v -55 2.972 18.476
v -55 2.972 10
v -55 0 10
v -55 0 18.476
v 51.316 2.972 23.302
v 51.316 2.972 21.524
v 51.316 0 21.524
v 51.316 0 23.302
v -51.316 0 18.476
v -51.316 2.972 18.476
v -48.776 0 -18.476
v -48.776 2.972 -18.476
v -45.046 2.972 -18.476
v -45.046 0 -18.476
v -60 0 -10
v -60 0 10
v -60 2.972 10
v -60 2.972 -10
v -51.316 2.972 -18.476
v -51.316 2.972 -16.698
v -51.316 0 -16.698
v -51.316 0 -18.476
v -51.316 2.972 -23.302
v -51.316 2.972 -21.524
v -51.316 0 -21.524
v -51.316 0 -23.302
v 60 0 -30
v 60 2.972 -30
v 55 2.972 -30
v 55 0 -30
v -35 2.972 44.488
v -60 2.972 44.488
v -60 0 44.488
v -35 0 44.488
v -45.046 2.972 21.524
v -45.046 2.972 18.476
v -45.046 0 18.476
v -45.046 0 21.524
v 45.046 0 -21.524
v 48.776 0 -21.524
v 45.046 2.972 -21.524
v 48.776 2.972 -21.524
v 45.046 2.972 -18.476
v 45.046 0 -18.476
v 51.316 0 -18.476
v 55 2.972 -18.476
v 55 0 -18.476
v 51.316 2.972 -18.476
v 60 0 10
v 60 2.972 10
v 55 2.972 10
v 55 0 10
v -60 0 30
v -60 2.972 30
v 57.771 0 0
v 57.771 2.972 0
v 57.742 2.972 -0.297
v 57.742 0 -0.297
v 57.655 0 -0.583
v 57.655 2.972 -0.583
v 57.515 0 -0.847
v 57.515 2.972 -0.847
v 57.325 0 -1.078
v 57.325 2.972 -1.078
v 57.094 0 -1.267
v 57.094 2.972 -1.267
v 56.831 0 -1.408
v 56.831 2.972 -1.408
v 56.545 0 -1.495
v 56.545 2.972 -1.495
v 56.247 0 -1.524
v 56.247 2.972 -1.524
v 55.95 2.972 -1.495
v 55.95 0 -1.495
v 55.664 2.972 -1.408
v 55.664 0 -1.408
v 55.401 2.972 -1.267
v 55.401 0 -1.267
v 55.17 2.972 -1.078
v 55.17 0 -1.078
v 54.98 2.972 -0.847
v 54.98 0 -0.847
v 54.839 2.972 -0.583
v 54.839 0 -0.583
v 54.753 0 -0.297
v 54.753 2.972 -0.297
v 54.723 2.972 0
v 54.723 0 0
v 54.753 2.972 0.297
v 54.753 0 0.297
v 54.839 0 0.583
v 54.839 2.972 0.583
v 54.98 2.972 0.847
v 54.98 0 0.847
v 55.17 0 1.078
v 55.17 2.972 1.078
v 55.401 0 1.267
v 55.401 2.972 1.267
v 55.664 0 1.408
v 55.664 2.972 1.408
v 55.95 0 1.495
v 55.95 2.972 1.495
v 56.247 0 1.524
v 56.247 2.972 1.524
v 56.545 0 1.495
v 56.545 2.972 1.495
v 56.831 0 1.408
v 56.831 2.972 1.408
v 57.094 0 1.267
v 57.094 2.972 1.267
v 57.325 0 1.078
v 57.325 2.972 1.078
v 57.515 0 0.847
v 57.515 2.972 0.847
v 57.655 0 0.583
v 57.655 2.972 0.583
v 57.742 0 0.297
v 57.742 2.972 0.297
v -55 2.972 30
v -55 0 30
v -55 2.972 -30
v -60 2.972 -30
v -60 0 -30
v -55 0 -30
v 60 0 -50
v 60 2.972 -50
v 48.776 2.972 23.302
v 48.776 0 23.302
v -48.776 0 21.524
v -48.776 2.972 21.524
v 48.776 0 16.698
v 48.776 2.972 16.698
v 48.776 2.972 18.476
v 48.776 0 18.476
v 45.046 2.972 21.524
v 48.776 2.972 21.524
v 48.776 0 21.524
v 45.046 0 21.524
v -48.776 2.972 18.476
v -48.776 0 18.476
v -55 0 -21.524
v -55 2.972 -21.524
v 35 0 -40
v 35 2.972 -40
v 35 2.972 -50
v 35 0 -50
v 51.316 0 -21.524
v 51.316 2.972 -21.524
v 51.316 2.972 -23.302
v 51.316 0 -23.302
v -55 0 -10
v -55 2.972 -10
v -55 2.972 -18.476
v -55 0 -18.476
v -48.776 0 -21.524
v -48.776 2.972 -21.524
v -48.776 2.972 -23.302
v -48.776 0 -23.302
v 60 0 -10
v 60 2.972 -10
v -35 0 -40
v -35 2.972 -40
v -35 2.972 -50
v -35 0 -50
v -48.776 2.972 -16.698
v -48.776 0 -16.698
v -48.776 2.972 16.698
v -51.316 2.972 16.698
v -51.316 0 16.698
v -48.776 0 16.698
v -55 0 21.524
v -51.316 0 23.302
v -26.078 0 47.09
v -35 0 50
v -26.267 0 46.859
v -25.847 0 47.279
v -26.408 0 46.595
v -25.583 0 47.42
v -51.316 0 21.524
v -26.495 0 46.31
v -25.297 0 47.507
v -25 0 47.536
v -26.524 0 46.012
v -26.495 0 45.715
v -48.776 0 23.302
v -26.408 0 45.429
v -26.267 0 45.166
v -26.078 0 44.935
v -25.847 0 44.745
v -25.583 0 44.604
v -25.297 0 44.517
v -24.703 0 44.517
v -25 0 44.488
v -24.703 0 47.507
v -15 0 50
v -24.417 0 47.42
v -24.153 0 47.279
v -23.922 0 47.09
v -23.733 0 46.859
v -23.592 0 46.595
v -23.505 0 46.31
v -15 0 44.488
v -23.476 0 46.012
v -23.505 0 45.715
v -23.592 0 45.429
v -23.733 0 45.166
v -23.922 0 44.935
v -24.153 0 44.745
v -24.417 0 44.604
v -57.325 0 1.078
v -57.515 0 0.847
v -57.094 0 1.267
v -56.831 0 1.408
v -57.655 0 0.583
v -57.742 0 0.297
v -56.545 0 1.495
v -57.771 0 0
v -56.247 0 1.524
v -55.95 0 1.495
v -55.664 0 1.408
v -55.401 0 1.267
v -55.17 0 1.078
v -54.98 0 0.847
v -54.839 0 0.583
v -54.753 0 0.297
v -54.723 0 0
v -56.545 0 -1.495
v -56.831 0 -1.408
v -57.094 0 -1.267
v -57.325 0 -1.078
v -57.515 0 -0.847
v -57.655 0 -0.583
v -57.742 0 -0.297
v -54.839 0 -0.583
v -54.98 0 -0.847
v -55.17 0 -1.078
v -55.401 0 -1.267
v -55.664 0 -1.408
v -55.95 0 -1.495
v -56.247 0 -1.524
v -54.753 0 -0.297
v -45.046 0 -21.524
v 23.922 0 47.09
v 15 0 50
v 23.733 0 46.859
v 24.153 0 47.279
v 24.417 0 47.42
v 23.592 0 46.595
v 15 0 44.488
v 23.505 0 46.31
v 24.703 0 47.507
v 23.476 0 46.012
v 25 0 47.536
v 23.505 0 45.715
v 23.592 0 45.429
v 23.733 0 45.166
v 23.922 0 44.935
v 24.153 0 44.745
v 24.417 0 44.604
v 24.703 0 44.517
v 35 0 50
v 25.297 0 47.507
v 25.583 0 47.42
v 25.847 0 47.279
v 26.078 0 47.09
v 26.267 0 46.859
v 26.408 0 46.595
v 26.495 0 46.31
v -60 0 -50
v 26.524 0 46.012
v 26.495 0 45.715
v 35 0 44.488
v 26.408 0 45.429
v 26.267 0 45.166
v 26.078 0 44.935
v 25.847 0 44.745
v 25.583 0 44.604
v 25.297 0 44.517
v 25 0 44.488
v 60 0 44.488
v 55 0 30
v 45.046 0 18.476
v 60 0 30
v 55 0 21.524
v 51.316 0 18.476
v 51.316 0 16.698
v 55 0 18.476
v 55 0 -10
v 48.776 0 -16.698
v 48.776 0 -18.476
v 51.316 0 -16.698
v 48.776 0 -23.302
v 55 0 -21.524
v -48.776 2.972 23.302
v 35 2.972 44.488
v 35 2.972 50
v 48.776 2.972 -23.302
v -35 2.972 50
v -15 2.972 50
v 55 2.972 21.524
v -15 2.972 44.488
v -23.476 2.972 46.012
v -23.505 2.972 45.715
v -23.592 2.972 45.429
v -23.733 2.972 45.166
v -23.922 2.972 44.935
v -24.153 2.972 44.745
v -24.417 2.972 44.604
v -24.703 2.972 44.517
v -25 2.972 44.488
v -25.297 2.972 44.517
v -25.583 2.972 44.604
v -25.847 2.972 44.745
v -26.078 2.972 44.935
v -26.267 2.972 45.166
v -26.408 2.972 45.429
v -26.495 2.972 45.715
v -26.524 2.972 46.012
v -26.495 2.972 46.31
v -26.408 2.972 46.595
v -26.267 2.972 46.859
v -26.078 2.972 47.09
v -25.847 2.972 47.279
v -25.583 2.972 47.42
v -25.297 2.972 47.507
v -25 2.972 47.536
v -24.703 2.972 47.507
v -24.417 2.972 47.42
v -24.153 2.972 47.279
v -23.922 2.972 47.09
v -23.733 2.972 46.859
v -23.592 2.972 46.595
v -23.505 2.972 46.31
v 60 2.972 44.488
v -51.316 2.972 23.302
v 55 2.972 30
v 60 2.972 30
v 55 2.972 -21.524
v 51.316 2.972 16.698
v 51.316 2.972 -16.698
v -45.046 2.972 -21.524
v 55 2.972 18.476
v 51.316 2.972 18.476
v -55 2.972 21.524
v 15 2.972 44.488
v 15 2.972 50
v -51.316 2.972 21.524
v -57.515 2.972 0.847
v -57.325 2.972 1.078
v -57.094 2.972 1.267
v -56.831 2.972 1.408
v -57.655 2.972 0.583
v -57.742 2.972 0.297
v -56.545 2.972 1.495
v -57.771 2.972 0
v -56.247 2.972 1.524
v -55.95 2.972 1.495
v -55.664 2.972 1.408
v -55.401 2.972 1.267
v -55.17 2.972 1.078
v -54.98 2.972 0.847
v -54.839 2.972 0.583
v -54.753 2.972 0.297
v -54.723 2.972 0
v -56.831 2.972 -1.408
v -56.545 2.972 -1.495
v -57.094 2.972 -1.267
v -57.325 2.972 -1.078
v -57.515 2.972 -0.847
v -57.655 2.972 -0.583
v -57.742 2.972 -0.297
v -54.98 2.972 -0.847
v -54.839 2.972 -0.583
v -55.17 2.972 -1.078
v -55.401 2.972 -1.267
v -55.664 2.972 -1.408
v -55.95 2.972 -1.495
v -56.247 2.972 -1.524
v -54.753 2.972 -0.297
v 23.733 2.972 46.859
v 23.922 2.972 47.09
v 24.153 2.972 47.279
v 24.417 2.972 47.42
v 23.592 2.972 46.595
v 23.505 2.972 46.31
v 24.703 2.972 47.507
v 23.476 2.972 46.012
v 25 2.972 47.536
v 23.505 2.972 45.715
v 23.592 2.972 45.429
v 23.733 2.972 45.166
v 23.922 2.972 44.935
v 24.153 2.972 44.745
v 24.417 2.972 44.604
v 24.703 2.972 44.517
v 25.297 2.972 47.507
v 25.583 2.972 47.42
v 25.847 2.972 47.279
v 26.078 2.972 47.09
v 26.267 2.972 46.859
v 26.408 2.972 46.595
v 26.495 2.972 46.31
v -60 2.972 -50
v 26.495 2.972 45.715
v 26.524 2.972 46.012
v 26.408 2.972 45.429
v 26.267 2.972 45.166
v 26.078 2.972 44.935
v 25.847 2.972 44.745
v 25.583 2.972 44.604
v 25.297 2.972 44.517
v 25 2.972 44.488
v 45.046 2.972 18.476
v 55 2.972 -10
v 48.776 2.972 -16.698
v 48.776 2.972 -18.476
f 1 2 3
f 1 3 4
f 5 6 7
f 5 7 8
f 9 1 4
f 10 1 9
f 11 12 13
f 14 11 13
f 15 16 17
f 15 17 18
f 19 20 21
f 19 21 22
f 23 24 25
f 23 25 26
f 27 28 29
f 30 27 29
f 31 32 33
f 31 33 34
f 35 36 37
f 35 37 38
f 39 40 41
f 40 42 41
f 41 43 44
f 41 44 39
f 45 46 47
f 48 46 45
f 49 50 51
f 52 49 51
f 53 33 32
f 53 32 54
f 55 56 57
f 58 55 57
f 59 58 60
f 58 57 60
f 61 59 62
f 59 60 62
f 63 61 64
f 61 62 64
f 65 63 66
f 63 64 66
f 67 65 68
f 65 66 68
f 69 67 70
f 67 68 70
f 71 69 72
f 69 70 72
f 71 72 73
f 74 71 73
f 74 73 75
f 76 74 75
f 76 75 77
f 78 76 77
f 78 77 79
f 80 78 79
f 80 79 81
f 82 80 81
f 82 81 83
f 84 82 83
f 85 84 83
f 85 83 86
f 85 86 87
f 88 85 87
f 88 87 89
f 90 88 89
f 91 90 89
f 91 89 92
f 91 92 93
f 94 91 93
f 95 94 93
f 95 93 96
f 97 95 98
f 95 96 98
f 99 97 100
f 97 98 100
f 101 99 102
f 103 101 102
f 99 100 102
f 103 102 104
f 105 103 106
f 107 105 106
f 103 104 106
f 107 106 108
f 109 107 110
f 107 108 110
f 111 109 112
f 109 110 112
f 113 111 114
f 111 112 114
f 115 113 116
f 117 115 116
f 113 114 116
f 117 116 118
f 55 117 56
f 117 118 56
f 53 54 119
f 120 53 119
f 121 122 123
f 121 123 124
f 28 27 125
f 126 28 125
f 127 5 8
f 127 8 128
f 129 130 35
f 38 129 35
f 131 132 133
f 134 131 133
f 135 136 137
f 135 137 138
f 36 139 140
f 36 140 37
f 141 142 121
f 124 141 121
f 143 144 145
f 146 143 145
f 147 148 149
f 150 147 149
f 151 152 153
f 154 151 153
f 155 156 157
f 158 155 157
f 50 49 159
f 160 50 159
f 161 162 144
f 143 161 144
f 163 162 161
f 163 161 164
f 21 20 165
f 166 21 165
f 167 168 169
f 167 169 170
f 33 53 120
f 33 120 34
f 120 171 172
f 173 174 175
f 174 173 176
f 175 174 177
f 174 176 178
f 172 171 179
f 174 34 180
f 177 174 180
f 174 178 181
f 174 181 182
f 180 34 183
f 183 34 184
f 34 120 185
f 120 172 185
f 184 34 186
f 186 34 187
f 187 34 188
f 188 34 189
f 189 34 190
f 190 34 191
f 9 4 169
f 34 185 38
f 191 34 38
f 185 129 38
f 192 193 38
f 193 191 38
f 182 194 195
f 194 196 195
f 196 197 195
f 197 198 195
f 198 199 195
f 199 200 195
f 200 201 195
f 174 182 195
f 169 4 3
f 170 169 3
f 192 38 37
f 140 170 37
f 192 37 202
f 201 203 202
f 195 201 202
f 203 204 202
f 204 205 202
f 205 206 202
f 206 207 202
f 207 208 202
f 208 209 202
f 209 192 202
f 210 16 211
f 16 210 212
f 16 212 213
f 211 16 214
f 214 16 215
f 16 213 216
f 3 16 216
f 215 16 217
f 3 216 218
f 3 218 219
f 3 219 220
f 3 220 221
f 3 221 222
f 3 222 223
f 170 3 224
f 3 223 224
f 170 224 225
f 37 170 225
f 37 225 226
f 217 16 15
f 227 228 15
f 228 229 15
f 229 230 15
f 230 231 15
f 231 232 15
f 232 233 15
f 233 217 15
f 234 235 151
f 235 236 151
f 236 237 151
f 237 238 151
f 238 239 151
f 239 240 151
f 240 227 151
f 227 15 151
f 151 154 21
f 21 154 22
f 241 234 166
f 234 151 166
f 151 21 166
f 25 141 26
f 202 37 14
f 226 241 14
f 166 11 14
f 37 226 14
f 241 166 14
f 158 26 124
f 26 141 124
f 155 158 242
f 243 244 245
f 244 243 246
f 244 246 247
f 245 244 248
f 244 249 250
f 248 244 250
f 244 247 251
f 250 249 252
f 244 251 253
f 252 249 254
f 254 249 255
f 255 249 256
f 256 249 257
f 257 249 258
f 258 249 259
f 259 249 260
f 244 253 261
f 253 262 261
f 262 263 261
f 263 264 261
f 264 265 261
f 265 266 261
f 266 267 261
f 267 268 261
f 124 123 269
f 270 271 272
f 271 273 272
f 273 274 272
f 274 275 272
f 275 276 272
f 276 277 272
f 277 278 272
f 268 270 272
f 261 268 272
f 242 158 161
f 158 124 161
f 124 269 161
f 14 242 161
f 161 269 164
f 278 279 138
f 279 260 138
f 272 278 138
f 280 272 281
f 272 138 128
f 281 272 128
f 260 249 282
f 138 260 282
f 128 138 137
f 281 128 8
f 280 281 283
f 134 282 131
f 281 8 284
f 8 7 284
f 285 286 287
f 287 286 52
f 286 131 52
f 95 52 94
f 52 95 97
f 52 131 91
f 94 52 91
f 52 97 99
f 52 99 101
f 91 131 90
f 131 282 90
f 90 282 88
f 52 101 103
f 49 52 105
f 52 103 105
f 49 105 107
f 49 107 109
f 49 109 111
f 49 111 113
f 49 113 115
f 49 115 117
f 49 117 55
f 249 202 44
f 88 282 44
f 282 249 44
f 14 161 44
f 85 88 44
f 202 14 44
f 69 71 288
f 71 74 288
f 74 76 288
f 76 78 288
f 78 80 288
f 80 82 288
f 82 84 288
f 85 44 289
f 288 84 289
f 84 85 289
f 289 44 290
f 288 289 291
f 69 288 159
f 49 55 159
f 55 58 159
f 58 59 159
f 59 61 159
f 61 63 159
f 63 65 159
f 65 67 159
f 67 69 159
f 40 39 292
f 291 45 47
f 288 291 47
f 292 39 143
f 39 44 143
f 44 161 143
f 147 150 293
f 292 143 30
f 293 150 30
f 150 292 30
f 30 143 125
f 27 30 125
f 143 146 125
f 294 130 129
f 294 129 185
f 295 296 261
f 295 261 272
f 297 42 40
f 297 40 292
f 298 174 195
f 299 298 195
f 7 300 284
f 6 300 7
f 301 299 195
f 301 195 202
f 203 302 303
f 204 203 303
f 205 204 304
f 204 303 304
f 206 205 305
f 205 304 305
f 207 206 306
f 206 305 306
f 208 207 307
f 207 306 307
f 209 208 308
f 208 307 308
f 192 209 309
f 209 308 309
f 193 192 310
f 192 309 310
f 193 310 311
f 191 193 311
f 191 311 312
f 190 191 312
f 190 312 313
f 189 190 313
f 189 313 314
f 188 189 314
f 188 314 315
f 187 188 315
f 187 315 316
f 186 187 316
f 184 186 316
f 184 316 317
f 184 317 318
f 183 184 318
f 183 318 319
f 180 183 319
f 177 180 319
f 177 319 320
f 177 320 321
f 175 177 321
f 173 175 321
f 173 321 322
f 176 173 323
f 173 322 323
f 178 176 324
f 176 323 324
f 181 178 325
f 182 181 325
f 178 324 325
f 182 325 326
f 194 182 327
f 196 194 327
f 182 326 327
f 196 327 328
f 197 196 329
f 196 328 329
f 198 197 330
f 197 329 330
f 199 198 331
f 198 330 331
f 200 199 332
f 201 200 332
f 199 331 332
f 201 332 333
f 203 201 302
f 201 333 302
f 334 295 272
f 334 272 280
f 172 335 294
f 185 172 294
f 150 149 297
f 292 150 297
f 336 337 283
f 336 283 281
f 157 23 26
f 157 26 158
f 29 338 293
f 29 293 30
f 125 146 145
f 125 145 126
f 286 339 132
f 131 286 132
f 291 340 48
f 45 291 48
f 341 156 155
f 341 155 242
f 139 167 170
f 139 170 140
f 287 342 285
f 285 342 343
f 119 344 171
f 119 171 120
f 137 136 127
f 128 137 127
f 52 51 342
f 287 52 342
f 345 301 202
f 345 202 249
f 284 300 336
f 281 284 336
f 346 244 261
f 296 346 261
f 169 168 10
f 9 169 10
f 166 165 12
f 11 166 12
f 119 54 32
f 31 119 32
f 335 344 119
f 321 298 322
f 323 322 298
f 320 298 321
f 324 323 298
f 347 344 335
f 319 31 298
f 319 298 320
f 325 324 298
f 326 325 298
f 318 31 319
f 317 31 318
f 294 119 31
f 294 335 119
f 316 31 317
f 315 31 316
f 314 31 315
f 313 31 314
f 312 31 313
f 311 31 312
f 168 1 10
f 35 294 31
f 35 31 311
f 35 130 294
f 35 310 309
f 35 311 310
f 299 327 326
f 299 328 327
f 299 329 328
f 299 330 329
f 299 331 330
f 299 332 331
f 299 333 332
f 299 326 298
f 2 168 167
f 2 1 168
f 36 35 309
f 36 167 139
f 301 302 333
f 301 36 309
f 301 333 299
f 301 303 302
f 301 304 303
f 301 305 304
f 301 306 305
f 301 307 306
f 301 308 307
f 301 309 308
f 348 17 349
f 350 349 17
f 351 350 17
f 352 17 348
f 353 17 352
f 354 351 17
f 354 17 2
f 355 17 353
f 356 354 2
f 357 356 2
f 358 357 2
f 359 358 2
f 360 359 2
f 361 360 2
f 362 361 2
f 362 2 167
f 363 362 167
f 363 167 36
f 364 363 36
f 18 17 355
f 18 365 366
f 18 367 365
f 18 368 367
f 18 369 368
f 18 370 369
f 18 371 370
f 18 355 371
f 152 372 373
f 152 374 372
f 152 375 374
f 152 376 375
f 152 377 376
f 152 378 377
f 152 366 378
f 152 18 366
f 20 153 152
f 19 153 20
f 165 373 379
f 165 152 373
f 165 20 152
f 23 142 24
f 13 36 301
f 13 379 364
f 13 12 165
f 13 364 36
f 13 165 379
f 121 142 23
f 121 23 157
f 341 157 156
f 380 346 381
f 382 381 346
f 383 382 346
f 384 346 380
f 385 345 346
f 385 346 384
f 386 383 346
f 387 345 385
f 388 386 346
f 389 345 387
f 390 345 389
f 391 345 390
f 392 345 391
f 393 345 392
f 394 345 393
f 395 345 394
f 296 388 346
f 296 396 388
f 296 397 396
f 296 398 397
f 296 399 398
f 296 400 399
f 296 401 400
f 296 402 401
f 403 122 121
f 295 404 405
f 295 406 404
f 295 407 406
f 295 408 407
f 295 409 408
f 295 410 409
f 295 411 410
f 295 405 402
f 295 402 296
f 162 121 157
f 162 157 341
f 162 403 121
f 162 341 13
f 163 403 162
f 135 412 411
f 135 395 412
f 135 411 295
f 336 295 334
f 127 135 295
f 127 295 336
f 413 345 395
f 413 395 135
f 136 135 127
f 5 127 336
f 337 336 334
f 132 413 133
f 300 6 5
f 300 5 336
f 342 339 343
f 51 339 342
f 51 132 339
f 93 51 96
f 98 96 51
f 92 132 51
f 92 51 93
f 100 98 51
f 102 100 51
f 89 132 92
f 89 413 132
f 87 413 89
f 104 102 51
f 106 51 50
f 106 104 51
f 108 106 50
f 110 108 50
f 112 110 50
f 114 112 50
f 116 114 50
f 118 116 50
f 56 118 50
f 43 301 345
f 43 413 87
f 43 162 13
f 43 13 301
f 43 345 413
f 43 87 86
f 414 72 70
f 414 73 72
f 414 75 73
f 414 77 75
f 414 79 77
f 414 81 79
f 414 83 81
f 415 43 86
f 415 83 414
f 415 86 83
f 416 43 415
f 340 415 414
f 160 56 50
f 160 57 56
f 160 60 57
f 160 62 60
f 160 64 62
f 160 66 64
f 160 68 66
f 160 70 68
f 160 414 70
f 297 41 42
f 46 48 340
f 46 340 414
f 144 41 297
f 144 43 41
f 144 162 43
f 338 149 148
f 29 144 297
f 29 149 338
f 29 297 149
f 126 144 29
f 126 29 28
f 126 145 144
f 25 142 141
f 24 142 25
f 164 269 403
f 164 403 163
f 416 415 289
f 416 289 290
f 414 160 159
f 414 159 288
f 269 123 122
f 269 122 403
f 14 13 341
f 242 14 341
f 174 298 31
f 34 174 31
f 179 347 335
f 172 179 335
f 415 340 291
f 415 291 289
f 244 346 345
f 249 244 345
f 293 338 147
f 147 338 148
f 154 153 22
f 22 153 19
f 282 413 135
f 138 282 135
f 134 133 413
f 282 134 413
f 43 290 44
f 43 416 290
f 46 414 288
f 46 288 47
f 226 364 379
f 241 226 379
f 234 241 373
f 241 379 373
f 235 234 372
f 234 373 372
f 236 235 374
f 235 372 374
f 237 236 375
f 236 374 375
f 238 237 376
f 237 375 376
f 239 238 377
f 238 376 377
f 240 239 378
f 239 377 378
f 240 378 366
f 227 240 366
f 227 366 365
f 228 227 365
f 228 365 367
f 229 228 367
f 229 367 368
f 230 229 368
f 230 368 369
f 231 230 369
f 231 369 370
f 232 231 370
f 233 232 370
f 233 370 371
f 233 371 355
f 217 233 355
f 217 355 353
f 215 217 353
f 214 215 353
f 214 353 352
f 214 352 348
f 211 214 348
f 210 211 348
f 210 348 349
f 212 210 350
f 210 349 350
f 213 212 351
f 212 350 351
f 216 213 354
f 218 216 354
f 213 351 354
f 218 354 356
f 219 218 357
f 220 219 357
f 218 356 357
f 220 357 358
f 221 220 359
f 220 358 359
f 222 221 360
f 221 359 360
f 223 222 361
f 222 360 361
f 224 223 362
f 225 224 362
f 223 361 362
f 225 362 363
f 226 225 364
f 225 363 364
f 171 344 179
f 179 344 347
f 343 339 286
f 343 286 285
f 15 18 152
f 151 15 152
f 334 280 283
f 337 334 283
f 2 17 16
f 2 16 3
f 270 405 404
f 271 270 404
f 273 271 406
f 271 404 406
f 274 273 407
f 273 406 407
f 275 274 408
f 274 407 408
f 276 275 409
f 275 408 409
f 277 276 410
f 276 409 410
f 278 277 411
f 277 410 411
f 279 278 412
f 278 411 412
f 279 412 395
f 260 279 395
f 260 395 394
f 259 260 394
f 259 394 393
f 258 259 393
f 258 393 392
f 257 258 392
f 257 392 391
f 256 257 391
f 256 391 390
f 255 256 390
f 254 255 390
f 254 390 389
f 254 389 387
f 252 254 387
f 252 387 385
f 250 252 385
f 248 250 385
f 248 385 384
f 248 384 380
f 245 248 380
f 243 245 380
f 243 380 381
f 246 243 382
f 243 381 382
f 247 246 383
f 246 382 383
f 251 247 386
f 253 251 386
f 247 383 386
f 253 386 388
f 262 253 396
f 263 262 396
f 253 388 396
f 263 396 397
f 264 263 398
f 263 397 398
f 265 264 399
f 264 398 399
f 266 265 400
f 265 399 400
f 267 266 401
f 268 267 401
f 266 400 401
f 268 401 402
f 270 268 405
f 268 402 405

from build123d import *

# Parameters (mm, degrees)
SKETCH1_W                 = 120
SKETCH1_H                 = 100
BOSS_EXTRUDE1_DEPTH       = 2.9718
SKETCH2_W                 = 70
SKETCH2_H                 = 20
CUT_EXTRUDE1_DEPTH        = 3.9718
SKETCH3_W                 = 29.908
SKETCH3_H                 = 3.048
CUT_EXTRUDE2_DEPTH        = 3.9718
SKETCH4_W                 = 10
SKETCH4_H                 = 20
SKETCH4_W_2               = 2.54
SKETCH4_H_2               = 6.604
CUT_EXTRUDE3_DEPTH        = 2.9718
MIRROR2_COPY_1_SKETCH_W   = 29.908
MIRROR2_COPY_1_SKETCH_H   = 3.048
MIRROR2_COPY_1_DEPTH      = 3.9718
MIRROR2_COPY_2_SKETCH_W   = 10
MIRROR2_COPY_2_SKETCH_H   = 20
MIRROR2_COPY_2_SKETCH_W_2 = 2.54
MIRROR2_COPY_2_SKETCH_H_2 = 6.604
MIRROR2_COPY_2_DEPTH      = 2.9718
SKETCH6_W                 = 50
SKETCH6_H                 = 11.0236
CUT_EXTRUDE4_DEPTH        = 3.9718
SKETCH7_W                 = 30
SKETCH7_H                 = 11.0236
CUT_EXTRUDE6_DEPTH        = 3.9718
SKETCH8_R                 = 1.524
CUT_EXTRUDE7_DEPTH        = 3.9718
SKETCH11_R                = 1.524
CUT_EXTRUDE8_DEPTH        = 3.9718


with BuildPart() as part:
    # Sketch1 → Boss-Extrude1 (new body)
    with BuildSketch(Plane(origin=(0, 0, 0), x_dir=(1, 0, 0), z_dir=(0, 1, 0))):
        Rectangle(SKETCH1_W, SKETCH1_H)
    extrude(amount=BOSS_EXTRUDE1_DEPTH)

    # Sketch2 → Cut-Extrude1 (cut, through all)
    with BuildSketch(Plane(origin=(0, 2.9718, 0), x_dir=(1, 0, 0), z_dir=(0, 1, 0))):
        with Locations((0, 50)):
            Rectangle(SKETCH2_W, SKETCH2_H)
    extrude(amount=-CUT_EXTRUDE1_DEPTH, mode=Mode.SUBTRACT)

    # Sketch3 → Cut-Extrude2 (cut, through all)
    with BuildSketch(Plane(origin=(0, 2.9718, 0), x_dir=(1, 0, 0), z_dir=(0, 1, 0))):
        with Locations((-60, 20)):
            Rectangle(SKETCH3_W, SKETCH3_H)
    cut_extrude2 = extrude(amount=-CUT_EXTRUDE2_DEPTH, mode=Mode.SUBTRACT)

    # Sketch4 → Cut-Extrude3 (cut)
    with BuildSketch(Plane(origin=(0, 2.9718, 0), x_dir=(1, 0, 0), z_dir=(0, 1, 0))):
        with Locations((-60, 20)):
            Rectangle(SKETCH4_W, SKETCH4_H)
        with Locations((-50.046, 20)):
            Rectangle(SKETCH4_W_2, SKETCH4_H_2)
    cut_extrude3 = extrude(amount=-CUT_EXTRUDE3_DEPTH, mode=Mode.SUBTRACT)

    # Mirror1: Cut-Extrude2, Cut-Extrude3 across plane
    add(cut_extrude2.mirror(Plane.XY), mode=Mode.SUBTRACT)
    add(cut_extrude3.mirror(Plane.XY), mode=Mode.SUBTRACT)

    # Mirror2: Cut-Extrude3, Cut-Extrude2 across plane
    add(cut_extrude3.mirror(Plane(origin=(0, 0, 0), x_dir=(0, 0, 1), z_dir=(1, 0, 0))), mode=Mode.SUBTRACT)
    add(cut_extrude2.mirror(Plane(origin=(0, 0, 0), x_dir=(0, 0, 1), z_dir=(1, 0, 0))), mode=Mode.SUBTRACT)

    # Mirror2 copy 1 sketch → Mirror2 copy 1 (cut, through all)
    with BuildSketch(Plane(origin=(0, 2.9718, 0), x_dir=(-1, 0, 0), z_dir=(0, 1, 0))):
        with Locations((-60, 20)):
            Rectangle(MIRROR2_COPY_1_SKETCH_W, MIRROR2_COPY_1_SKETCH_H)
    extrude(amount=-MIRROR2_COPY_1_DEPTH, mode=Mode.SUBTRACT)

    # Mirror2 copy 2 sketch → Mirror2 copy 2 (cut)
    with BuildSketch(Plane(origin=(0, 2.9718, 0), x_dir=(-1, 0, 0), z_dir=(0, 1, 0))):
        with Locations((-60, 20)):
            Rectangle(MIRROR2_COPY_2_SKETCH_W, MIRROR2_COPY_2_SKETCH_H)
        with Locations((-50.046, 20)):
            Rectangle(MIRROR2_COPY_2_SKETCH_W_2, MIRROR2_COPY_2_SKETCH_H_2)
    extrude(amount=-MIRROR2_COPY_2_DEPTH, mode=Mode.SUBTRACT)

    # Sketch6 → Cut-Extrude4 (cut, through all)
    with BuildSketch(Plane(origin=(0, 2.9718, 0), x_dir=(1, 0, 0), z_dir=(0, 1, 0))):
        with Locations((-60, -50)):
            Rectangle(SKETCH6_W, SKETCH6_H)
        with Locations((60, -50)):
            Rectangle(SKETCH6_W, SKETCH6_H)
    extrude(amount=-CUT_EXTRUDE4_DEPTH, mode=Mode.SUBTRACT)

    # Sketch7 → Cut-Extrude6 (cut, through all)
    with BuildSketch(Plane(origin=(0, 2.9718, 0), x_dir=(1, 0, 0), z_dir=(0, 1, 0))):
        with Locations((0, -50)):
            Rectangle(SKETCH7_W, SKETCH7_H)
    extrude(amount=-CUT_EXTRUDE6_DEPTH, mode=Mode.SUBTRACT)

    # Sketch8 → Cut-Extrude7 (cut, through all)
    with BuildSketch(Plane(origin=(0, 2.9718, 0), x_dir=(1, 0, 0), z_dir=(0, 1, 0))):
        with Locations((-25, -46.0122)):
            Circle(SKETCH8_R)
        with Locations((25, -46.0122)):
            Circle(SKETCH8_R)
    extrude(amount=-CUT_EXTRUDE7_DEPTH, mode=Mode.SUBTRACT)

    # Sketch11 → Cut-Extrude8 (cut, through all)
    with BuildSketch(Plane(origin=(0, 2.9718, 0), x_dir=(1, 0, 0), z_dir=(0, 1, 0))):
        with Locations((-56.2474, 0)):
            Circle(SKETCH11_R)
        with Locations((56.2474, 0)):
            Circle(SKETCH11_R)
    extrude(amount=-CUT_EXTRUDE8_DEPTH, mode=Mode.SUBTRACT)


solid = part.part
